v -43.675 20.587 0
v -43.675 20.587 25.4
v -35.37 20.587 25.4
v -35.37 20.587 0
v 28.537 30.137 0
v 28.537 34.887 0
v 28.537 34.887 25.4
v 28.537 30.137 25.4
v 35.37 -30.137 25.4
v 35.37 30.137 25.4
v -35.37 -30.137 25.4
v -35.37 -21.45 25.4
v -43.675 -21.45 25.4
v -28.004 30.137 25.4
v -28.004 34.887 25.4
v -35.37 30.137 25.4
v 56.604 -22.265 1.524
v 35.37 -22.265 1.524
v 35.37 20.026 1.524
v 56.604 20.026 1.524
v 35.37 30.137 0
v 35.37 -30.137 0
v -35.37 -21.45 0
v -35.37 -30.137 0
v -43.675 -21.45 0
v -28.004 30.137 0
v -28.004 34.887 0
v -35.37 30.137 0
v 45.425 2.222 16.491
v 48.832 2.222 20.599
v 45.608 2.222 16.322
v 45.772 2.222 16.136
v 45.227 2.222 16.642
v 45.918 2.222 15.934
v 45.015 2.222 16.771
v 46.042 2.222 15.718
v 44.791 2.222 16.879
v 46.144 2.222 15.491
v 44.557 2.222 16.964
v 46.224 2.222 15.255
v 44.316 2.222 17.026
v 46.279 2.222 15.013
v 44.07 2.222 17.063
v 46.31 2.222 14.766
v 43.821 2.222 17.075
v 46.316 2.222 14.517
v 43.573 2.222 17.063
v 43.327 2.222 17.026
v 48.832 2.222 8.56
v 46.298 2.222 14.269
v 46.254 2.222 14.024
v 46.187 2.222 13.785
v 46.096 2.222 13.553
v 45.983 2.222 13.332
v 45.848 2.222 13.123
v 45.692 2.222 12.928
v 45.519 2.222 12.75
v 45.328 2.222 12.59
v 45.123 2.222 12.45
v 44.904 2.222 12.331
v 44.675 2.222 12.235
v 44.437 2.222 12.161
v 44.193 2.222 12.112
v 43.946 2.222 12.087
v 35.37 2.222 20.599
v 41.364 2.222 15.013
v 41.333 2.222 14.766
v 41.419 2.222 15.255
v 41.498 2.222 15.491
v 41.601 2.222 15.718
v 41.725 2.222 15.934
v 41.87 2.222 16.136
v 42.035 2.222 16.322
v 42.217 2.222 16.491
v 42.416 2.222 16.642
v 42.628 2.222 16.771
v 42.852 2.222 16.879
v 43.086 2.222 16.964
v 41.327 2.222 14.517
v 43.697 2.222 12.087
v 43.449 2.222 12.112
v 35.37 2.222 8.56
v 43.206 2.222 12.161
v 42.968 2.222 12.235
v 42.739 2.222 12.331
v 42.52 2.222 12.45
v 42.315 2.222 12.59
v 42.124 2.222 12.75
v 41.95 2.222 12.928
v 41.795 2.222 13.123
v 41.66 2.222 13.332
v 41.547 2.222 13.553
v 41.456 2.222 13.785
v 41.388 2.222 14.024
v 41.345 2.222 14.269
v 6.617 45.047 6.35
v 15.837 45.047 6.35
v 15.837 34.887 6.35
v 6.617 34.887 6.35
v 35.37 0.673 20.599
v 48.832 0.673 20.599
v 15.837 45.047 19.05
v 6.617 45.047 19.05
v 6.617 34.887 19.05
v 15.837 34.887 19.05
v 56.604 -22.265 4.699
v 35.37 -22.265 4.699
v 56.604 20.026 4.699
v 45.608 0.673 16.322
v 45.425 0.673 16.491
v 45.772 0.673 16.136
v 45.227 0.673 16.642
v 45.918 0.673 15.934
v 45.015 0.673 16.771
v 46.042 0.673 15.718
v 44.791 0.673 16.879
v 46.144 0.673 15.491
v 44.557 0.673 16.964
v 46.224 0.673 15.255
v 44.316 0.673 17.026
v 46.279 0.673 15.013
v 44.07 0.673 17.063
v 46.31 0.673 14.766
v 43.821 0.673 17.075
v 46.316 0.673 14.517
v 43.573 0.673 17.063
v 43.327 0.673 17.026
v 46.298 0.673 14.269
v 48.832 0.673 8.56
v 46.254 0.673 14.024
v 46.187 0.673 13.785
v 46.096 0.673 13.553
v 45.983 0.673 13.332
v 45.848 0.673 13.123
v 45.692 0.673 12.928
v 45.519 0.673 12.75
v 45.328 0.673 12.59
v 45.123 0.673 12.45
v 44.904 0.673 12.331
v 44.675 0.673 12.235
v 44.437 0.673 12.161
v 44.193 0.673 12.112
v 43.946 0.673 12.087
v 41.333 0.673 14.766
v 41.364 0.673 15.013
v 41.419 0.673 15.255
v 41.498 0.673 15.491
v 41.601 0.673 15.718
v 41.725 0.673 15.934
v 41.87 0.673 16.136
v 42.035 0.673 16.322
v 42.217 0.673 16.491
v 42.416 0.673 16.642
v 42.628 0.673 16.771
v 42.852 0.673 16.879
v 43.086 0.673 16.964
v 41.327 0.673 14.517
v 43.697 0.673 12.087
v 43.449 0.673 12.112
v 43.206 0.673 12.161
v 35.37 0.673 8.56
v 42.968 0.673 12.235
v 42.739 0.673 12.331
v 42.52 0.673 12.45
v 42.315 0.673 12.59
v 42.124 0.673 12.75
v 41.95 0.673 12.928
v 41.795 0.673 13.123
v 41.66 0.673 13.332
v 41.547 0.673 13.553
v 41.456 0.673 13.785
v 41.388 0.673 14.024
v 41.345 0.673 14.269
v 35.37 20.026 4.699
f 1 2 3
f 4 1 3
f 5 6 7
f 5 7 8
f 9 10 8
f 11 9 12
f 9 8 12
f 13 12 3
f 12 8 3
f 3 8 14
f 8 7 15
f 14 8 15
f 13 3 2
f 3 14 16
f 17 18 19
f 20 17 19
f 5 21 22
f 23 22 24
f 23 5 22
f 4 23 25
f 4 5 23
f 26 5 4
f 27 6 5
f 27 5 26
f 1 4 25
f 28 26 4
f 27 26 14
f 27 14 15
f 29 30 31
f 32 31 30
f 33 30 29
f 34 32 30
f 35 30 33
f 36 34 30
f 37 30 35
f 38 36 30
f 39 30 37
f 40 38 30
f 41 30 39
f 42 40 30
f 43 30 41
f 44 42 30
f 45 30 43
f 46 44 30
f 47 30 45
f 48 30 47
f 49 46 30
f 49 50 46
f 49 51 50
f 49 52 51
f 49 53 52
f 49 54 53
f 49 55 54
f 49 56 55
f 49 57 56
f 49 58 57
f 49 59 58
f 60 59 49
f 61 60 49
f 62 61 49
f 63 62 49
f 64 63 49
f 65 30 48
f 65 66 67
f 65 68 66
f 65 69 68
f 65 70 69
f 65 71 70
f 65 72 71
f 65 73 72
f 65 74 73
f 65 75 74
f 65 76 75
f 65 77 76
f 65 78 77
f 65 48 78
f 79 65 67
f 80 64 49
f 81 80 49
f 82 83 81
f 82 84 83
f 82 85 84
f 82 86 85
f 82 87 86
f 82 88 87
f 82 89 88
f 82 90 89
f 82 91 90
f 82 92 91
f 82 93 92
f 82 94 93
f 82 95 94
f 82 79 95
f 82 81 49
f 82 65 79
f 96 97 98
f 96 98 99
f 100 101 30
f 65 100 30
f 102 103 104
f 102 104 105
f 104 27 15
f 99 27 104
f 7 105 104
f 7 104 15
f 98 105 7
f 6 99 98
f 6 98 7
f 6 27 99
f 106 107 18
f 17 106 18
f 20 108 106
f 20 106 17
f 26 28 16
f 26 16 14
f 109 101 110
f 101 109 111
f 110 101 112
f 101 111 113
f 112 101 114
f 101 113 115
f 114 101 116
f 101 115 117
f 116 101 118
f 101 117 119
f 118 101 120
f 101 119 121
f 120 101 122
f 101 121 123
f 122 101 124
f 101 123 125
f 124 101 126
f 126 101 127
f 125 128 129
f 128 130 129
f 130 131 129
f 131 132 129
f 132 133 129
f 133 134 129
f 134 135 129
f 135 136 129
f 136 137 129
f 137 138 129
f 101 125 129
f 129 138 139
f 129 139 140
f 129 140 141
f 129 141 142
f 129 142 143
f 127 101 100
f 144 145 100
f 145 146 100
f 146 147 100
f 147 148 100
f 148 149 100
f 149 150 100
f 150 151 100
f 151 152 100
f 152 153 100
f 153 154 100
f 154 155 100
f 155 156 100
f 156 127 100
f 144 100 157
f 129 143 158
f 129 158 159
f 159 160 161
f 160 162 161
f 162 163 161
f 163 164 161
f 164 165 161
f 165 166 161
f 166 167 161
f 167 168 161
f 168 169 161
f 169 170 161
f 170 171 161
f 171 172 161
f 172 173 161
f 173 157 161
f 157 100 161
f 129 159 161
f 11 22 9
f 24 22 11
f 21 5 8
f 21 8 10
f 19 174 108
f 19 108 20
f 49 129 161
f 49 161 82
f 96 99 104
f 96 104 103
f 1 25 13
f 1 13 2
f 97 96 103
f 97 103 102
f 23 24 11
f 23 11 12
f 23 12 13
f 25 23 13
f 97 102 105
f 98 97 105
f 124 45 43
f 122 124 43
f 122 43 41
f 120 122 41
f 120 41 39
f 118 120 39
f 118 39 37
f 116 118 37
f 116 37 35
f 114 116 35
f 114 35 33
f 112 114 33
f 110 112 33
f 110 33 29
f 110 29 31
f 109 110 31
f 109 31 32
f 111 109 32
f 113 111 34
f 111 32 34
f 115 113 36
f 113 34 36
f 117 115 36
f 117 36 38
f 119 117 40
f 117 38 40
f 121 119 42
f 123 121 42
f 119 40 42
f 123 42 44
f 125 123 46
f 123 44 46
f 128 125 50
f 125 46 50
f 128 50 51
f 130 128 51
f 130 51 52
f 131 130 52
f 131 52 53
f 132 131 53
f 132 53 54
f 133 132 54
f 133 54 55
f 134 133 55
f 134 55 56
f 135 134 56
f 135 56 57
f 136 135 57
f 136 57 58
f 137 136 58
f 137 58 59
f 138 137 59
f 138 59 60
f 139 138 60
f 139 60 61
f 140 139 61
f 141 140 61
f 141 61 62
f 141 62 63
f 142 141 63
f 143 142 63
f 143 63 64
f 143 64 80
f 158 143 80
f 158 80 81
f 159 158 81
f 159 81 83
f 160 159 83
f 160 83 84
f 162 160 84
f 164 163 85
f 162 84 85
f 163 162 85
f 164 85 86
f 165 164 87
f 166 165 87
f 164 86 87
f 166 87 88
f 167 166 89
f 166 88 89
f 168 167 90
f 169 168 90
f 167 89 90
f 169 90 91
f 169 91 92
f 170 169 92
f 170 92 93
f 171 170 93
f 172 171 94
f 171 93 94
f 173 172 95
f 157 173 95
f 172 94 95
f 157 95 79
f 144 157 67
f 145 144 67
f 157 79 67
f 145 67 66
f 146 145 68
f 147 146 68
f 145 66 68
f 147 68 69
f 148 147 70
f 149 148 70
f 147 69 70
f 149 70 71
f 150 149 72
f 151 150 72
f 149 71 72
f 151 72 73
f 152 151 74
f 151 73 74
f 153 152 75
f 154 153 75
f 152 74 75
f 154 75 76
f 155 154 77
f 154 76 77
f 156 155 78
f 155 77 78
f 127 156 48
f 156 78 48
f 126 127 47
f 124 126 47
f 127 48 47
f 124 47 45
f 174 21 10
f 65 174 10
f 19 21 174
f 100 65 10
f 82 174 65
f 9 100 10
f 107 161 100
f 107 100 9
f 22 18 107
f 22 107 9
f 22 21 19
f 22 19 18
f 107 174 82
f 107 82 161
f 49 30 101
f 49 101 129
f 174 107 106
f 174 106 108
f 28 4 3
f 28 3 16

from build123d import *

# Parameters (mm, degrees)
BOSS_EXTRUDE1_DEPTH = 25.4
SKETCH2_W           = 3.175
SKETCH2_H           = 42.291
BOSS_EXTRUDE2_DEPTH = 21.2344
SKETCH3_W           = 12.0396
SKETCH3_H           = 1.5494
BOSS_EXTRUDE3_DEPTH = 13.462
SKETCH4_R           = 2.49555
CUT_EXTRUDE1_DEPTH  = 16.51
SKETCH5_W           = 9.2202
SKETCH5_H           = 10.16
CUT_EXTRUDE2_DEPTH  = 6.35
SKETCH6_W           = 9.2202
SKETCH6_H           = 10.16
CUT_EXTRUDE3_DEPTH  = 6.35


with BuildPart() as part:
    # Sketch1 → Boss-Extrude1 (new body)
    with BuildSketch(Plane.XY):
        Polygon((28.5369, 30.1371), (35.3695, 30.1371), (35.3695, -30.1371), (-35.3695, -30.1371), (-35.3695, -21.4503), (-43.6753, -21.4503), (-43.6753, 20.5867), (-35.3695, 20.5867), (-35.3695, 30.1371), (-28.0035, 30.1371), (-28.0035, 34.8869), (6.6167, 34.8869), (6.6167, 45.0469), (15.8369, 45.0469), (15.8369, 34.8869), (28.5369, 34.8869), align=None)
    extrude(amount=BOSS_EXTRUDE1_DEPTH)

    # Sketch2 → Boss-Extrude2 (add)
    with BuildSketch(Plane(origin=(35.3695, 0, 0), x_dir=(0, 0, -1), z_dir=(1, 0, 0))):
        with Locations((-3.1115, -1.11983587)):
            Rectangle(SKETCH2_W, SKETCH2_H)
    extrude(amount=BOSS_EXTRUDE2_DEPTH)

    # Sketch3 → Boss-Extrude3 (add)
    with BuildSketch(Plane(origin=(35.3695, 0, 0), x_dir=(0, 0, -1), z_dir=(1, 0, 0))):
        with Locations((-14.5796, 1.4478)):
            Rectangle(SKETCH3_W, SKETCH3_H)
    extrude(amount=BOSS_EXTRUDE3_DEPTH)

    # Sketch4 → Cut-Extrude1 (cut)
    with BuildSketch(Plane(origin=(0, 2.2225, 0), x_dir=(1, 0, 0), z_dir=(0, 1, 0))):
        with Locations(Location((43.82135, -14.5796, 0), (0, 0, 270))):
            Circle(SKETCH4_R)
    extrude(amount=-CUT_EXTRUDE1_DEPTH, mode=Mode.SUBTRACT)

    # Sketch5 → Cut-Extrude2 (cut)
    with BuildSketch(Plane.XY.offset(25.4)):
        with Locations((11.2268, 39.9669)):
            Rectangle(SKETCH5_W, SKETCH5_H)
    extrude(amount=-CUT_EXTRUDE2_DEPTH, mode=Mode.SUBTRACT)

    # Sketch6 → Cut-Extrude3 (cut)
    with BuildSketch(Plane(origin=(0, 0, 0), x_dir=(-1, 0, 0), z_dir=(0, 0, -1))):
        with Locations((-11.2268, 39.9669)):
            Rectangle(SKETCH6_W, SKETCH6_H)
    extrude(amount=-CUT_EXTRUDE3_DEPTH, mode=Mode.SUBTRACT)


solid = part.part
